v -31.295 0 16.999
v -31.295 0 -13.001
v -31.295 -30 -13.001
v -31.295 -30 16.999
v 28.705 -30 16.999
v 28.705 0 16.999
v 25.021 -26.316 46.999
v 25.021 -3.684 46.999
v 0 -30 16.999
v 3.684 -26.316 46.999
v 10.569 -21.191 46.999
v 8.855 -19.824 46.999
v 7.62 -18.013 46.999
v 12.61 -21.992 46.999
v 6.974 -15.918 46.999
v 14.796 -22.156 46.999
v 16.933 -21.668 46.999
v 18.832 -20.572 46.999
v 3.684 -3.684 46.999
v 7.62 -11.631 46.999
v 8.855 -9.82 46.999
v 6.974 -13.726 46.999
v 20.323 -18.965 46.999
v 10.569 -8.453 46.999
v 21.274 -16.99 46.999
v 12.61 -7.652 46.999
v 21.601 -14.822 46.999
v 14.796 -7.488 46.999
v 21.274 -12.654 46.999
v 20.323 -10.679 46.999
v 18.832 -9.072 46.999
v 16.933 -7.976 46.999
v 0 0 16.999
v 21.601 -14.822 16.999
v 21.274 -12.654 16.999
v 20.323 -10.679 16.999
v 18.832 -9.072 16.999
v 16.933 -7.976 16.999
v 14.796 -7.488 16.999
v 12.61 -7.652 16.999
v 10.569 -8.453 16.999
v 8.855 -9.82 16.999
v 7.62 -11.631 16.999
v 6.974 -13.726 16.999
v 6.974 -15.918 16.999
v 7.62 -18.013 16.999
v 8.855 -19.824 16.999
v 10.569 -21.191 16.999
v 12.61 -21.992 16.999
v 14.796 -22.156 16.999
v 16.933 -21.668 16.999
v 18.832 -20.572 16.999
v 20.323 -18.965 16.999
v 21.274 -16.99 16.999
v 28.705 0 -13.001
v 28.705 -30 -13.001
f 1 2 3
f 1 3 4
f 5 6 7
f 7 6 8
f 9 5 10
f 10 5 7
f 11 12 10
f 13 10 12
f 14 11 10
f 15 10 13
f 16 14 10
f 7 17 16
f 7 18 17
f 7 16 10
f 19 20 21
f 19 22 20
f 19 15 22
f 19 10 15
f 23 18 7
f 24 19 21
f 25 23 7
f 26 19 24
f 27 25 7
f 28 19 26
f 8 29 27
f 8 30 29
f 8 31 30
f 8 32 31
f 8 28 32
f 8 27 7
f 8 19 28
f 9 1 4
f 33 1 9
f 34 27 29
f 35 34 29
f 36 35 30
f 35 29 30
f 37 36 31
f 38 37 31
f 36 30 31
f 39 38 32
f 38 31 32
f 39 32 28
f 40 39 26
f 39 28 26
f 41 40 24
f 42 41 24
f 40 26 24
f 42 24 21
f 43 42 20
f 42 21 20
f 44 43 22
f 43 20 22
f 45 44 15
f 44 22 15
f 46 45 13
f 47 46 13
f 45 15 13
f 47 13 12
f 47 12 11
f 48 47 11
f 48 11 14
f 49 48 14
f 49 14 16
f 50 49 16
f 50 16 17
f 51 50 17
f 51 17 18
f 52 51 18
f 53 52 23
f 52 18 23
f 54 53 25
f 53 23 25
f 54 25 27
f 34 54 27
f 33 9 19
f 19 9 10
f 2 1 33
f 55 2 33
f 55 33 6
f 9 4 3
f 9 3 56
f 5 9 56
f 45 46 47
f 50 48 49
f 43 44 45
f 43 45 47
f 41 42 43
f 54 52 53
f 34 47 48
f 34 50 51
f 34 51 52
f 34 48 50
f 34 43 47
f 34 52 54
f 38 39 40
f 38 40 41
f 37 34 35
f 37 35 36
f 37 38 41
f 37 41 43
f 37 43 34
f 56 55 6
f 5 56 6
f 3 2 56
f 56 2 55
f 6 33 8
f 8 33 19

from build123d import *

# Parameters (mm, degrees)
F0_W     = 60
F0_H     = 30
F1_DEPTH = 30
F2_W     = 28.7048730254
F2_H     = 30
F3_DEPTH = 30
F3_TAPER = 7
F4_R     = 7.3545492497
F5_DEPTH = 30


with BuildPart() as f1:
    # F0 (on Front) → F1 (new body)
    with BuildSketch(Plane.XZ):
        with Locations((-1.2951269746, 1.9989533018)):
            Rectangle(F0_W, F0_H)
    extrude(amount=F1_DEPTH)

    # F2 (on face) → F3 (join)
    with BuildSketch(Plane.XY.offset(16.9989533018)):
        with Locations((14.3524365127, -15)):
            Rectangle(F2_W, F2_H)
    extrude(amount=F3_DEPTH, taper=F3_TAPER)

    # F4 (on face) → F5 (cut)
    with BuildSketch(Plane.XY.offset(46.9989533018)):
        with Locations((14.2463864759, -14.8219969124)):
            Circle(F4_R)
    extrude(amount=-F5_DEPTH, mode=Mode.SUBTRACT)


solid = f1.part
